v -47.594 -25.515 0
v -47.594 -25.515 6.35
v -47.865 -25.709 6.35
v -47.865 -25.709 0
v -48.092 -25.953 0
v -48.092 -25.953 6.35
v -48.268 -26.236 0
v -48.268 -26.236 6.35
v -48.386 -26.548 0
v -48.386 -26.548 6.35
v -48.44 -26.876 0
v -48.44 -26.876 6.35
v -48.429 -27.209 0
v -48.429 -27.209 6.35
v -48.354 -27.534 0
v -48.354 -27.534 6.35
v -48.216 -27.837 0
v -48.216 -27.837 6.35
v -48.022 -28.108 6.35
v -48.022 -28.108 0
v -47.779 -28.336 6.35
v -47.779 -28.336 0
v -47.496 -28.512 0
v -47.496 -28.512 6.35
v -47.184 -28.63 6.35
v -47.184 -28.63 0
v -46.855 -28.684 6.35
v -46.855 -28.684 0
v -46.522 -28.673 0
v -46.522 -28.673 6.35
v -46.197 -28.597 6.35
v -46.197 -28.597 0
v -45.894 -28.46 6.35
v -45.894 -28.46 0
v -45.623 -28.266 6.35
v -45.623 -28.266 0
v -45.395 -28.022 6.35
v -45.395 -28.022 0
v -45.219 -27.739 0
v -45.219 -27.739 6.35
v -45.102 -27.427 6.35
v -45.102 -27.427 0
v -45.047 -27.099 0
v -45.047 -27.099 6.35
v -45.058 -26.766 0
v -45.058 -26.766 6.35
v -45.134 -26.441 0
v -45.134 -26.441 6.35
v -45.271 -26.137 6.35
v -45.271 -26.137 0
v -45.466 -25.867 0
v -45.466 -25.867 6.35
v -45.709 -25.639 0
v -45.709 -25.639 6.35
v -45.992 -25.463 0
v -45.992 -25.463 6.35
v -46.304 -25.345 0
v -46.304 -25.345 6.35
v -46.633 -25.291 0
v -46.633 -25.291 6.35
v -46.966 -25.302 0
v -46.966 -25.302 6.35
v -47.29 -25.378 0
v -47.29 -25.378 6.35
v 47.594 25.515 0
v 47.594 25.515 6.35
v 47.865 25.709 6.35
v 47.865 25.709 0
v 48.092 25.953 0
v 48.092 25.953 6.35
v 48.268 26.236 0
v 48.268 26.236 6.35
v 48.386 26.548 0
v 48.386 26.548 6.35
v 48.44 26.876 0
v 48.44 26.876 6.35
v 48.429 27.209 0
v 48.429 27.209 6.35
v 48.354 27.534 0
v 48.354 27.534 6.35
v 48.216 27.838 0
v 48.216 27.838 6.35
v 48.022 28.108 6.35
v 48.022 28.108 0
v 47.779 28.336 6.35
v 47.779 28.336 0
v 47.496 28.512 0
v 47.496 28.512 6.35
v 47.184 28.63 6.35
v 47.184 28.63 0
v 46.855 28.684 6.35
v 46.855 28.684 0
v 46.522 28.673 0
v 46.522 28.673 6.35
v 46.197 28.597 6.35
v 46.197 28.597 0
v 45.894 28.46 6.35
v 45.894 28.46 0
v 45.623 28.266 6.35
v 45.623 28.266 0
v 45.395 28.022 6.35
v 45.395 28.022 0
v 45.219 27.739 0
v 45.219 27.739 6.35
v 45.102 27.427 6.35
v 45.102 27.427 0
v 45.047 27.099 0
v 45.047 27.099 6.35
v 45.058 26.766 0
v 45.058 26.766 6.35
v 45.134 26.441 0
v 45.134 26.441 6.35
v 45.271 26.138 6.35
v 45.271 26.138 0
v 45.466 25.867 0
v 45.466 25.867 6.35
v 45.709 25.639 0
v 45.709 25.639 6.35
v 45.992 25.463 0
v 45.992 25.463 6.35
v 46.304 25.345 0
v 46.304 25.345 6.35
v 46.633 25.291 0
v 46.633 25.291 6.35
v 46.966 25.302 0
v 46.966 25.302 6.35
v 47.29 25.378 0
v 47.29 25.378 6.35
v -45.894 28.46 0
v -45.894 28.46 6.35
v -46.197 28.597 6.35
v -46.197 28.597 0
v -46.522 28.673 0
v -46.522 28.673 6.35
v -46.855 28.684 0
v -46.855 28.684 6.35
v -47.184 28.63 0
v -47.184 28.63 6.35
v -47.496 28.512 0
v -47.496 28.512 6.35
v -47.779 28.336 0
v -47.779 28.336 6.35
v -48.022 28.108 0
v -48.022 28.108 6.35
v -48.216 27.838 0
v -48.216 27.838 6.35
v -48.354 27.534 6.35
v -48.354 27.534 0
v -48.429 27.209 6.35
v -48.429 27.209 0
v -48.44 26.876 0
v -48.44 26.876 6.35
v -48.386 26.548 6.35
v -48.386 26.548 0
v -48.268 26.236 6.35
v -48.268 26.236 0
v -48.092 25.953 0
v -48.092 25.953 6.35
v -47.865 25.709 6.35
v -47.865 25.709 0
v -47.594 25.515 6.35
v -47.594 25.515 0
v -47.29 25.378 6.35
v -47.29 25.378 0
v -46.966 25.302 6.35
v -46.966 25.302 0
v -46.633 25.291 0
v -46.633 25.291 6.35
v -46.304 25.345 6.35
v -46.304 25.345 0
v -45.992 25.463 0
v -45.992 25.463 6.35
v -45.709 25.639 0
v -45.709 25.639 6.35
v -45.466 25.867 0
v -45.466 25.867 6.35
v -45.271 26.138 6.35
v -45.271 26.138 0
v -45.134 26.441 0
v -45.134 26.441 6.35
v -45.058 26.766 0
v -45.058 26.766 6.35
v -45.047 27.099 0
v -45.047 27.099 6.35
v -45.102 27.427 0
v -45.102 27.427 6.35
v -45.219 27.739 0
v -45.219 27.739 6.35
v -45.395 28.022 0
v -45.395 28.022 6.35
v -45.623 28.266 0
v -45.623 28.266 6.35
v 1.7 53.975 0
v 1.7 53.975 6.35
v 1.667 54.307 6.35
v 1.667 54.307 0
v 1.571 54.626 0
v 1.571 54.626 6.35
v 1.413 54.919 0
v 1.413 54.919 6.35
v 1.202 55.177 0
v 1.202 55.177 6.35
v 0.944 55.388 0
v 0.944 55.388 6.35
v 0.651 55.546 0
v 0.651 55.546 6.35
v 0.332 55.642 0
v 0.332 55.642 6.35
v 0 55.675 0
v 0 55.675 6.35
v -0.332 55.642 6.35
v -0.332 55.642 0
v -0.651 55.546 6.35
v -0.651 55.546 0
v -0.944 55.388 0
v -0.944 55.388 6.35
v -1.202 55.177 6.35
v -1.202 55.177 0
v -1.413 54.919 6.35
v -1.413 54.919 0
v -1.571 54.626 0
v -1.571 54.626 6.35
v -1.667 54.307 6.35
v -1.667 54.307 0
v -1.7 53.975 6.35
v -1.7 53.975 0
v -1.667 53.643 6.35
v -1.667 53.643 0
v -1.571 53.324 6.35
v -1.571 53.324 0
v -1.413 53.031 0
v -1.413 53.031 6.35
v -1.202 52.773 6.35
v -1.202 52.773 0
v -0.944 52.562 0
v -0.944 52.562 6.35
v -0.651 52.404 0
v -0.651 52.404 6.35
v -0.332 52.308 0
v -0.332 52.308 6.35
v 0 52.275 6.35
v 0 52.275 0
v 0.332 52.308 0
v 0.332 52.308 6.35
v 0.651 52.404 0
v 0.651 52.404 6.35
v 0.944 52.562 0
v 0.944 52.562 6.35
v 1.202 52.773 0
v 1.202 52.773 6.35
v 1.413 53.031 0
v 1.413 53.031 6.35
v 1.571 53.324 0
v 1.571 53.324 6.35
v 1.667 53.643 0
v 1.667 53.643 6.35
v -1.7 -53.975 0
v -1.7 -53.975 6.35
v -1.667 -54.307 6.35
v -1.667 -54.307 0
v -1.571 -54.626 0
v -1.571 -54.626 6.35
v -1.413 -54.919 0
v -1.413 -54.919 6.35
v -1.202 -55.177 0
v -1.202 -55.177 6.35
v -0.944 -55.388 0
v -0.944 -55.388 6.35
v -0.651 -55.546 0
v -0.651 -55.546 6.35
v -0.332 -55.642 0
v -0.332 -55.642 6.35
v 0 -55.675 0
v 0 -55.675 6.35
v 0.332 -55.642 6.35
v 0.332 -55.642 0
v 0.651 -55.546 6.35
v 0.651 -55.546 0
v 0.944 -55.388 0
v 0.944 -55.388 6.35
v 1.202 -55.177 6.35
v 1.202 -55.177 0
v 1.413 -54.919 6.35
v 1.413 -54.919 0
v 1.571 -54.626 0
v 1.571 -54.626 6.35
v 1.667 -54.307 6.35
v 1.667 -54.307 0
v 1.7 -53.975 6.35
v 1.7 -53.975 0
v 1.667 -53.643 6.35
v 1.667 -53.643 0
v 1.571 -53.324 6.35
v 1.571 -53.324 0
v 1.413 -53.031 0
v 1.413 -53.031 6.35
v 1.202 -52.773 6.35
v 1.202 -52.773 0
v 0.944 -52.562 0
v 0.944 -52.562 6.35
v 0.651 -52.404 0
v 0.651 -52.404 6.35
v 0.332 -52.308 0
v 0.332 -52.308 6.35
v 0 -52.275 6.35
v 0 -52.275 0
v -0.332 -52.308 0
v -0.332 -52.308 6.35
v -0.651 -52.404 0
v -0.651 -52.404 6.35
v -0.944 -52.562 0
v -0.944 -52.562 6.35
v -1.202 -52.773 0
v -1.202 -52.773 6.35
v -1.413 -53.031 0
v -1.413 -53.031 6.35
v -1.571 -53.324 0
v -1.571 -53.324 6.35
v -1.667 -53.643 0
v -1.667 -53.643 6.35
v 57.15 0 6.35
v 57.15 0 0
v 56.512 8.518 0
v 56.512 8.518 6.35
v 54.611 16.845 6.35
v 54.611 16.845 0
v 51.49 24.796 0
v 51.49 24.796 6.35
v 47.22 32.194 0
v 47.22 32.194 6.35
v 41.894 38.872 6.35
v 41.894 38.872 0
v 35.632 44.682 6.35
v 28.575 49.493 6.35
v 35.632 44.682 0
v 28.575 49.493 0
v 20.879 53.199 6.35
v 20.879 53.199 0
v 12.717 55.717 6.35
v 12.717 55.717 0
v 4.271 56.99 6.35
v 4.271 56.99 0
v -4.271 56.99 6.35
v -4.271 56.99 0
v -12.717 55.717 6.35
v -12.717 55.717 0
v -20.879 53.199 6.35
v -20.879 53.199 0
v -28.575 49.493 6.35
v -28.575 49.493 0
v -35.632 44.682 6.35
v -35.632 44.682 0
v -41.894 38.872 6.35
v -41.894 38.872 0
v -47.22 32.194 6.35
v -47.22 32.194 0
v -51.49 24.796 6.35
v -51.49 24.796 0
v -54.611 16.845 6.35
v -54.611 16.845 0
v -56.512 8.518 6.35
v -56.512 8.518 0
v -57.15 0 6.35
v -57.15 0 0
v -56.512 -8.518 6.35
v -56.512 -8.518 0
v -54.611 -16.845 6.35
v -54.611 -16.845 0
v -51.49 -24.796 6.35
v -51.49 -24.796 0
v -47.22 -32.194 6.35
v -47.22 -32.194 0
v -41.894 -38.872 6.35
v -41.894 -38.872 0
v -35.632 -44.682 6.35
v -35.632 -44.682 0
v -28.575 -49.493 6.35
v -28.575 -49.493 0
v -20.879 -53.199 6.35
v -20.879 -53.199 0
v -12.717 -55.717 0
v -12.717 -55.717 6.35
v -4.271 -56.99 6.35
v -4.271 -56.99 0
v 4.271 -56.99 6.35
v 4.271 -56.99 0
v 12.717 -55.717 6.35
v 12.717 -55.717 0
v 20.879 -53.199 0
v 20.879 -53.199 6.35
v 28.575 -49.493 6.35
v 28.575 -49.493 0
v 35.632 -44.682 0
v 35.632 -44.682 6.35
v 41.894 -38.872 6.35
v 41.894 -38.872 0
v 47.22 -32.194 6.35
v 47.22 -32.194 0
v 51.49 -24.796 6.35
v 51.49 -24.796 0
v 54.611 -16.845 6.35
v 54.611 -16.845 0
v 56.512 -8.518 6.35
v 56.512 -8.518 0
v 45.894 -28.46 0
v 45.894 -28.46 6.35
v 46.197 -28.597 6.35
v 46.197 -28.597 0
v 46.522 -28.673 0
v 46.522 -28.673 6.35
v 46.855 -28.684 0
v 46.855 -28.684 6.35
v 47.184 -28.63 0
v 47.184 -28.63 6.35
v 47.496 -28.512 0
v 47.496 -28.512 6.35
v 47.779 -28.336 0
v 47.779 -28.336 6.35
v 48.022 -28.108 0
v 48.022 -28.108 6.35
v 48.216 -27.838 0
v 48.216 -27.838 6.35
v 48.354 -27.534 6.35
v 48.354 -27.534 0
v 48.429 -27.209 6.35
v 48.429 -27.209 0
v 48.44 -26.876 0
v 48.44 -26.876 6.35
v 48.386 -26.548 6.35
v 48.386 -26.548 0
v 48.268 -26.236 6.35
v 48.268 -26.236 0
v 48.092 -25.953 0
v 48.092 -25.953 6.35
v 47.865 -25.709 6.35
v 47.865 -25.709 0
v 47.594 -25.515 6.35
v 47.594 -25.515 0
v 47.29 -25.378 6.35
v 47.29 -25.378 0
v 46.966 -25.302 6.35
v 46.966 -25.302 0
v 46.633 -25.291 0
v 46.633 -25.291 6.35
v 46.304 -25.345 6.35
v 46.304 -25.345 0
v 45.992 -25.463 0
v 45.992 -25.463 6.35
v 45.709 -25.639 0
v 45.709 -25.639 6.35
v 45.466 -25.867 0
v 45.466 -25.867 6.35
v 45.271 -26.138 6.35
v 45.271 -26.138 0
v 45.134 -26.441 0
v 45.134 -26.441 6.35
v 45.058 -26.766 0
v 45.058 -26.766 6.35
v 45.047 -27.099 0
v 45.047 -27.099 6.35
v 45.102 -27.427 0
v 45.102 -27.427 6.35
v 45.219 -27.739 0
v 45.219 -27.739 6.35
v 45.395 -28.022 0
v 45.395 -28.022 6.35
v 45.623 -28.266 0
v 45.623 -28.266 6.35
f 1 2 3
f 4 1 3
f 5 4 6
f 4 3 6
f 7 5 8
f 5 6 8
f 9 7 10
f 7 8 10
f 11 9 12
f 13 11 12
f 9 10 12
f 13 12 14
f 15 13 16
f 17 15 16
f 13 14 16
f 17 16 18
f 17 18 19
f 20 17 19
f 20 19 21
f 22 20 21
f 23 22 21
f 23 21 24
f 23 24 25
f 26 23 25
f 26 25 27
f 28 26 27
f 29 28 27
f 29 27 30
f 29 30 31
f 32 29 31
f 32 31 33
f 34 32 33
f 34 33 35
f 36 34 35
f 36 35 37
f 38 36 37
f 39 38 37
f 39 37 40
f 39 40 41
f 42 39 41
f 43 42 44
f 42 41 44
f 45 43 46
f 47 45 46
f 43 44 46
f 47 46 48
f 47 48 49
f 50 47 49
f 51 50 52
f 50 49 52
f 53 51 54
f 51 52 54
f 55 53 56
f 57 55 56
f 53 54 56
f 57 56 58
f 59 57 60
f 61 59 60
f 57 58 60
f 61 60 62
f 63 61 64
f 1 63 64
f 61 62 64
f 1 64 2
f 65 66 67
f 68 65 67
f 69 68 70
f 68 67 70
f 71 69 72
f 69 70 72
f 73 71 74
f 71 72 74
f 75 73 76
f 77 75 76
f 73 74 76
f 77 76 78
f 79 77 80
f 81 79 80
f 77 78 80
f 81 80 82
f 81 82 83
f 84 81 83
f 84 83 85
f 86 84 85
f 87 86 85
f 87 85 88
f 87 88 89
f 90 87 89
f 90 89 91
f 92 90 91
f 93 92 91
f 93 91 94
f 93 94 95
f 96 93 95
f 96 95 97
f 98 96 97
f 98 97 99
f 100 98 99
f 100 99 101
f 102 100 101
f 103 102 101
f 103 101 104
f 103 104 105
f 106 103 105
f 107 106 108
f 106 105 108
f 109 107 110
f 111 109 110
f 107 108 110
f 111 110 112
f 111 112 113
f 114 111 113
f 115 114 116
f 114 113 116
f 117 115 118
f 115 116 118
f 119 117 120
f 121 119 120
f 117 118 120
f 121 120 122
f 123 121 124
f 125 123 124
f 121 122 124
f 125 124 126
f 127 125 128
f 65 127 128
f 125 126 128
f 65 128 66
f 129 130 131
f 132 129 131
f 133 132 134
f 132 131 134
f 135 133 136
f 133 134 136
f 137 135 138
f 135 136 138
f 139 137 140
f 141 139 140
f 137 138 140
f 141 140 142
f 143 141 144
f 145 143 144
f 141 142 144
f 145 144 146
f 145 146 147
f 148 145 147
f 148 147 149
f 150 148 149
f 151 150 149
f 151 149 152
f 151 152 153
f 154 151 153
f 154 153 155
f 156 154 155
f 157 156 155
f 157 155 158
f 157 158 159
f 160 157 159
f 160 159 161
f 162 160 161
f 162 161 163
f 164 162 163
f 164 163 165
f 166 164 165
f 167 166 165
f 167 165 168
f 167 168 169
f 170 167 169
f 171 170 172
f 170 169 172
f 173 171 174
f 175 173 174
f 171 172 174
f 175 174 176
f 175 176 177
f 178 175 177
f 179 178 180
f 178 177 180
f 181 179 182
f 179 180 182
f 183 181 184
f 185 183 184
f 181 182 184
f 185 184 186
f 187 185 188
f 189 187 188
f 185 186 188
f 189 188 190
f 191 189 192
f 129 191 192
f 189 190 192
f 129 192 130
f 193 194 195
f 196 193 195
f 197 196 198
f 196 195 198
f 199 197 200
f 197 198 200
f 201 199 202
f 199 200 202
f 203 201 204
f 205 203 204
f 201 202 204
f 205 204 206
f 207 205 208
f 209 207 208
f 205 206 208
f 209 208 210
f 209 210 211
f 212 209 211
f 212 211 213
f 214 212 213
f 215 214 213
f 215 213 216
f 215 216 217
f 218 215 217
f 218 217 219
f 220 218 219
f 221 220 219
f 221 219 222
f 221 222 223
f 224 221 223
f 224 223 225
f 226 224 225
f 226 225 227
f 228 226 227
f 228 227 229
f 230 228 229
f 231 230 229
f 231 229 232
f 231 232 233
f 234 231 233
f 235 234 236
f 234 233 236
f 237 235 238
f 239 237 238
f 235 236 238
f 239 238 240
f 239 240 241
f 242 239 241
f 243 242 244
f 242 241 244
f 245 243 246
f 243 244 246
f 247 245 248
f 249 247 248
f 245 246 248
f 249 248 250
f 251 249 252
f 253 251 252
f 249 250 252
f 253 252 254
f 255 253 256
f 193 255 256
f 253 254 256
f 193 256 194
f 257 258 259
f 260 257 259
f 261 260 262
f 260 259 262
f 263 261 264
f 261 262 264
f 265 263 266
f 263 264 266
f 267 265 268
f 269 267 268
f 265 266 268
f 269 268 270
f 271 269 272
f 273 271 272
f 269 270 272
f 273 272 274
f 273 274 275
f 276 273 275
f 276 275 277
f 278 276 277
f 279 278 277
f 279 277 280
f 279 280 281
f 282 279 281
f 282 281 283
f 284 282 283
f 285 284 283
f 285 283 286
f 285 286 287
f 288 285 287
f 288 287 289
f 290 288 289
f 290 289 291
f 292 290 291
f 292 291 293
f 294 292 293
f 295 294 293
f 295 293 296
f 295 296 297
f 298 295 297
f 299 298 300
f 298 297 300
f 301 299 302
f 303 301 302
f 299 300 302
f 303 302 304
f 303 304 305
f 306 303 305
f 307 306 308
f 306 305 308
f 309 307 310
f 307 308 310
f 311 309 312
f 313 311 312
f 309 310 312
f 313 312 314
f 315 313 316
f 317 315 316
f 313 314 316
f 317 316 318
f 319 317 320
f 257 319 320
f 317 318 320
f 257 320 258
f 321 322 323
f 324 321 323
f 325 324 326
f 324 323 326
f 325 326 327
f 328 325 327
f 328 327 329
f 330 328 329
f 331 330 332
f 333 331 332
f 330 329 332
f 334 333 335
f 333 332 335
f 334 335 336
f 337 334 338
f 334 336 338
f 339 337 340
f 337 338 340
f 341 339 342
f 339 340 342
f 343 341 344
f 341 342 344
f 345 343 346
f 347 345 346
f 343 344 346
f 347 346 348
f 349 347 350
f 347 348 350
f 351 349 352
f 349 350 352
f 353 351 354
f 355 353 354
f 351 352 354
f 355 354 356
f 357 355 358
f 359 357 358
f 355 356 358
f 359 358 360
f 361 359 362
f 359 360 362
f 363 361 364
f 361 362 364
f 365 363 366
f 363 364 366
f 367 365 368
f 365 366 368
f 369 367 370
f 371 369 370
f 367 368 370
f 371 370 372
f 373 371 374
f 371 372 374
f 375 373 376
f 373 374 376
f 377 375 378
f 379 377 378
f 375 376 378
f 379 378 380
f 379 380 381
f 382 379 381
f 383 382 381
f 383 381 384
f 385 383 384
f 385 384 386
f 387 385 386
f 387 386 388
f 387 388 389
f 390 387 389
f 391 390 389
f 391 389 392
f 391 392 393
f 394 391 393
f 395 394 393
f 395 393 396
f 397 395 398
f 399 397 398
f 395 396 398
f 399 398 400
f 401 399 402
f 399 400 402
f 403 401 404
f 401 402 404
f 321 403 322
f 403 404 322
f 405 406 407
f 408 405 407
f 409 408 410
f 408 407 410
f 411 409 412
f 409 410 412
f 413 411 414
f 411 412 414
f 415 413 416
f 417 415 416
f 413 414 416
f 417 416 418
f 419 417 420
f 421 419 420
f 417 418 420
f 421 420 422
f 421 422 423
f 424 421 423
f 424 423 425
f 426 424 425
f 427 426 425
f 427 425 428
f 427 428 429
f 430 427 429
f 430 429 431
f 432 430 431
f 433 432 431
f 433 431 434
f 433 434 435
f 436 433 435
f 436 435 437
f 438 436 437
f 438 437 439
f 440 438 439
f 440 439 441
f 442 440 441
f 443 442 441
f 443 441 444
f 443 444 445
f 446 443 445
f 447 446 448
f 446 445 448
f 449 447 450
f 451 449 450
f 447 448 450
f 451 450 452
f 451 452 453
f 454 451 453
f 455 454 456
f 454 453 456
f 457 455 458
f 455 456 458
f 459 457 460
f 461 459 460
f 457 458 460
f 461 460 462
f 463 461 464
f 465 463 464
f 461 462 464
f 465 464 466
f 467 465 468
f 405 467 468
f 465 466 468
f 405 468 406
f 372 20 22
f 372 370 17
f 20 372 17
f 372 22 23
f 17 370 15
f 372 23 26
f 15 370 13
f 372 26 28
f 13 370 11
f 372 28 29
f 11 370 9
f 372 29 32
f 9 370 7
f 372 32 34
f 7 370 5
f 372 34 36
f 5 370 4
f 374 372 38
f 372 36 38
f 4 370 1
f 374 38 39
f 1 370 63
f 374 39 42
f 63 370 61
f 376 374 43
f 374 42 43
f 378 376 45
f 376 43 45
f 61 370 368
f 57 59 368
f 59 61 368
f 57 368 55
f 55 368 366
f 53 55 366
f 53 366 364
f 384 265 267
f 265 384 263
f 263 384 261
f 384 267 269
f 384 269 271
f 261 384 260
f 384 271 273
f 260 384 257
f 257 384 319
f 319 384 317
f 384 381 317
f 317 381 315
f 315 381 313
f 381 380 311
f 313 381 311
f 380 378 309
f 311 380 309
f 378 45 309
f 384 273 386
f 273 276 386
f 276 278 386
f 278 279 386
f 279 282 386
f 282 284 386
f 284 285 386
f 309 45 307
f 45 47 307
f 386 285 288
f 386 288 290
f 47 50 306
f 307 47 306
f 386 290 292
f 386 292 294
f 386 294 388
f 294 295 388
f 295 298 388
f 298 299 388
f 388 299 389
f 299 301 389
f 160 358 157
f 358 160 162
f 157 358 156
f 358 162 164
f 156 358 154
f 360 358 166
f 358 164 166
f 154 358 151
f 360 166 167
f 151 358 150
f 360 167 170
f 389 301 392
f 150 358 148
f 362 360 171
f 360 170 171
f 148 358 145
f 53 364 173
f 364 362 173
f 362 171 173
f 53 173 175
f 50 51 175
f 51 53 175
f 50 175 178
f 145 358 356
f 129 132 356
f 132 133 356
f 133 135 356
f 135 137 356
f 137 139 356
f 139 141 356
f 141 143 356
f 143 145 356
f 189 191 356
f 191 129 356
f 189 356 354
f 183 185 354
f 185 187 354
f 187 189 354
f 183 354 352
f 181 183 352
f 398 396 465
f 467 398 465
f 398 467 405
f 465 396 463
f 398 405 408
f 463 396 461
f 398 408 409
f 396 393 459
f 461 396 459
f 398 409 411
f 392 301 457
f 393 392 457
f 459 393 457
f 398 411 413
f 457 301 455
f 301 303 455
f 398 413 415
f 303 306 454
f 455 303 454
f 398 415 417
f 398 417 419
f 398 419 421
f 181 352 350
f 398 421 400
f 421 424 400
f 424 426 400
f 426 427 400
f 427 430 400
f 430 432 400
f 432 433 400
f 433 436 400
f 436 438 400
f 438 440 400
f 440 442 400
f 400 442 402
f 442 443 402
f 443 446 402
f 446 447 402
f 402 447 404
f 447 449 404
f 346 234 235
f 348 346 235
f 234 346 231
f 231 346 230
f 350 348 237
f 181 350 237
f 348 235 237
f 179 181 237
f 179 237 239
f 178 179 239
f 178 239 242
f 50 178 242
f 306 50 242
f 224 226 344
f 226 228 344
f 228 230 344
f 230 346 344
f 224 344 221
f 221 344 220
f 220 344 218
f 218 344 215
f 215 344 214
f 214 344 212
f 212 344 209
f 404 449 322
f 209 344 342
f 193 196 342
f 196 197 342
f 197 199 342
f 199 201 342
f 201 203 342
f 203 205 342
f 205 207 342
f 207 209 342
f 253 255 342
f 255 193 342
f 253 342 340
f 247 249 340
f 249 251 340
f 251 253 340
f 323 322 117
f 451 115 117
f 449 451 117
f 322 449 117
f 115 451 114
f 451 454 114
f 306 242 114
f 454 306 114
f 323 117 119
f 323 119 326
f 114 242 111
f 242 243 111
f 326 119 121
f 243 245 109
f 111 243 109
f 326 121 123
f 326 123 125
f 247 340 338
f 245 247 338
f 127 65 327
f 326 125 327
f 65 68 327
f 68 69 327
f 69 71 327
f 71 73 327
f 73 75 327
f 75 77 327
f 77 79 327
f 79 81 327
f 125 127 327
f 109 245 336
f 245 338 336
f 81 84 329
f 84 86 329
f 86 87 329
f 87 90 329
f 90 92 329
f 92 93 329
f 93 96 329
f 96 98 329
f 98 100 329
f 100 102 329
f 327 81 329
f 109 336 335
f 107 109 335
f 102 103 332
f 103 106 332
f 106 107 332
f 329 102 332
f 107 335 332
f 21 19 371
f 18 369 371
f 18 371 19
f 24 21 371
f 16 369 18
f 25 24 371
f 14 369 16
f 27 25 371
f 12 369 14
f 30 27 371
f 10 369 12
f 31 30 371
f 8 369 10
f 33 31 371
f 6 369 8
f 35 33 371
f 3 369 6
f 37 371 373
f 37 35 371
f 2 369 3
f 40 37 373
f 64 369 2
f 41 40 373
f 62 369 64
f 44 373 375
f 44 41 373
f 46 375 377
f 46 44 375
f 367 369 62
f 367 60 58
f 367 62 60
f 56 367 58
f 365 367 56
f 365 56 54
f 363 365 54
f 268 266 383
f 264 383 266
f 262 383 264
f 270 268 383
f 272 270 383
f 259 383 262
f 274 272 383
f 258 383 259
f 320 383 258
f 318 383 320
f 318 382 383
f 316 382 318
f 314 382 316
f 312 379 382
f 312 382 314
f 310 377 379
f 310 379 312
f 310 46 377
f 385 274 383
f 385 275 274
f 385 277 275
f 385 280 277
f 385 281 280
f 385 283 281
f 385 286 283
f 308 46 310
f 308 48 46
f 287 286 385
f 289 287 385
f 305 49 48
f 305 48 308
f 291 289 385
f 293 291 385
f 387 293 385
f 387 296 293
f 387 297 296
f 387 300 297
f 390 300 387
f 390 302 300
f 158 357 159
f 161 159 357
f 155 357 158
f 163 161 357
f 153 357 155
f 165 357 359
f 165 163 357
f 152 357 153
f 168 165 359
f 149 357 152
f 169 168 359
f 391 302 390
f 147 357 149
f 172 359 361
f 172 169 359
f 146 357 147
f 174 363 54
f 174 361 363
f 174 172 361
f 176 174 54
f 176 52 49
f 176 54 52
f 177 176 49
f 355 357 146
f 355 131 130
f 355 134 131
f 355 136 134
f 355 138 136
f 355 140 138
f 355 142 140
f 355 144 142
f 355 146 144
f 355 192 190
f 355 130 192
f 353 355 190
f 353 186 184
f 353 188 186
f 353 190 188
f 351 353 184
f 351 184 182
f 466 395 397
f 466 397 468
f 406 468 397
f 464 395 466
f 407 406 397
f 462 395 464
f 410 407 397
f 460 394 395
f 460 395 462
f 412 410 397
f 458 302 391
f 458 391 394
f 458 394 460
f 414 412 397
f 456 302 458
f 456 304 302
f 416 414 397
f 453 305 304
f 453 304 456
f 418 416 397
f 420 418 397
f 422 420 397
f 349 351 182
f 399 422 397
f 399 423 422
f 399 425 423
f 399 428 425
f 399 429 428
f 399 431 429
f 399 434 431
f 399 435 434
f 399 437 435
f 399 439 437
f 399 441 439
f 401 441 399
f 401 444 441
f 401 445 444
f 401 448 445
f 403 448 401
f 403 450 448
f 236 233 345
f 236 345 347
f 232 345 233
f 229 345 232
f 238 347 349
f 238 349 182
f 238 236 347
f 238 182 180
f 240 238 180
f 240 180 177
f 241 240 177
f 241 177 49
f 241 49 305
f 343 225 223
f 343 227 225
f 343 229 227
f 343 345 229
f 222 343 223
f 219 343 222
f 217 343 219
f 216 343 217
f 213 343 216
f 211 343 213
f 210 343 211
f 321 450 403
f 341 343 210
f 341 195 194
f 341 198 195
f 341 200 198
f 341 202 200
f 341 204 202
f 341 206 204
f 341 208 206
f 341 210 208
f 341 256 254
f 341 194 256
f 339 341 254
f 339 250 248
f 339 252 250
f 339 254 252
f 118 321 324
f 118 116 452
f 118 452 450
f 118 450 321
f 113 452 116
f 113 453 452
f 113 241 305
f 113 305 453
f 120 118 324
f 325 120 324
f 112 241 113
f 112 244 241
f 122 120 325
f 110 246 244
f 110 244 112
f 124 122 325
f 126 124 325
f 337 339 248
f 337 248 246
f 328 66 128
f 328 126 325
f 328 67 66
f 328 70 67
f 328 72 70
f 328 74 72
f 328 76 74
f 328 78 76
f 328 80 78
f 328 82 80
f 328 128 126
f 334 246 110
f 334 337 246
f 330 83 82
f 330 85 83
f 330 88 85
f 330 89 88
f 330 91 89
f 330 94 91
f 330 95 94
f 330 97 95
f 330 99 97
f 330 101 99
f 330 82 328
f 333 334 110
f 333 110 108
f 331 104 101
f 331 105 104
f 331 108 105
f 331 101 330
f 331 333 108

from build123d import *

# Parameters (mm, degrees)
SKETCH2_R           = 57.15
BOSS_EXTRUDE1_DEPTH = 6.35
SKETCH6_R           = 1.7
CUT_EXTRUDE4_DEPTH  = 7.35
CIRPATTERN3_COUNT   = 6


with BuildPart() as part:
    # Sketch2 → Boss-Extrude1 (new body)
    with BuildSketch(Plane.XY):
        Circle(SKETCH2_R)
    extrude(amount=BOSS_EXTRUDE1_DEPTH)

    # Sketch6 → Cut-Extrude4 (cut, through all)
    with BuildSketch(Plane.XY.offset(6.35)):
        with Locations((0, 53.975)):
            Circle(SKETCH6_R)
    cut_extrude4 = extrude(amount=-CUT_EXTRUDE4_DEPTH, mode=Mode.SUBTRACT)

    # CirPattern3: Cut-Extrude4 ×6 about axis
    cirpattern3_axis = Axis((0, 0, 0), (0, 0, 1))
    for i in range(1, CIRPATTERN3_COUNT):
        add(cut_extrude4.rotate(cirpattern3_axis, i * 360 / CIRPATTERN3_COUNT), mode=Mode.SUBTRACT)


solid = part.part
